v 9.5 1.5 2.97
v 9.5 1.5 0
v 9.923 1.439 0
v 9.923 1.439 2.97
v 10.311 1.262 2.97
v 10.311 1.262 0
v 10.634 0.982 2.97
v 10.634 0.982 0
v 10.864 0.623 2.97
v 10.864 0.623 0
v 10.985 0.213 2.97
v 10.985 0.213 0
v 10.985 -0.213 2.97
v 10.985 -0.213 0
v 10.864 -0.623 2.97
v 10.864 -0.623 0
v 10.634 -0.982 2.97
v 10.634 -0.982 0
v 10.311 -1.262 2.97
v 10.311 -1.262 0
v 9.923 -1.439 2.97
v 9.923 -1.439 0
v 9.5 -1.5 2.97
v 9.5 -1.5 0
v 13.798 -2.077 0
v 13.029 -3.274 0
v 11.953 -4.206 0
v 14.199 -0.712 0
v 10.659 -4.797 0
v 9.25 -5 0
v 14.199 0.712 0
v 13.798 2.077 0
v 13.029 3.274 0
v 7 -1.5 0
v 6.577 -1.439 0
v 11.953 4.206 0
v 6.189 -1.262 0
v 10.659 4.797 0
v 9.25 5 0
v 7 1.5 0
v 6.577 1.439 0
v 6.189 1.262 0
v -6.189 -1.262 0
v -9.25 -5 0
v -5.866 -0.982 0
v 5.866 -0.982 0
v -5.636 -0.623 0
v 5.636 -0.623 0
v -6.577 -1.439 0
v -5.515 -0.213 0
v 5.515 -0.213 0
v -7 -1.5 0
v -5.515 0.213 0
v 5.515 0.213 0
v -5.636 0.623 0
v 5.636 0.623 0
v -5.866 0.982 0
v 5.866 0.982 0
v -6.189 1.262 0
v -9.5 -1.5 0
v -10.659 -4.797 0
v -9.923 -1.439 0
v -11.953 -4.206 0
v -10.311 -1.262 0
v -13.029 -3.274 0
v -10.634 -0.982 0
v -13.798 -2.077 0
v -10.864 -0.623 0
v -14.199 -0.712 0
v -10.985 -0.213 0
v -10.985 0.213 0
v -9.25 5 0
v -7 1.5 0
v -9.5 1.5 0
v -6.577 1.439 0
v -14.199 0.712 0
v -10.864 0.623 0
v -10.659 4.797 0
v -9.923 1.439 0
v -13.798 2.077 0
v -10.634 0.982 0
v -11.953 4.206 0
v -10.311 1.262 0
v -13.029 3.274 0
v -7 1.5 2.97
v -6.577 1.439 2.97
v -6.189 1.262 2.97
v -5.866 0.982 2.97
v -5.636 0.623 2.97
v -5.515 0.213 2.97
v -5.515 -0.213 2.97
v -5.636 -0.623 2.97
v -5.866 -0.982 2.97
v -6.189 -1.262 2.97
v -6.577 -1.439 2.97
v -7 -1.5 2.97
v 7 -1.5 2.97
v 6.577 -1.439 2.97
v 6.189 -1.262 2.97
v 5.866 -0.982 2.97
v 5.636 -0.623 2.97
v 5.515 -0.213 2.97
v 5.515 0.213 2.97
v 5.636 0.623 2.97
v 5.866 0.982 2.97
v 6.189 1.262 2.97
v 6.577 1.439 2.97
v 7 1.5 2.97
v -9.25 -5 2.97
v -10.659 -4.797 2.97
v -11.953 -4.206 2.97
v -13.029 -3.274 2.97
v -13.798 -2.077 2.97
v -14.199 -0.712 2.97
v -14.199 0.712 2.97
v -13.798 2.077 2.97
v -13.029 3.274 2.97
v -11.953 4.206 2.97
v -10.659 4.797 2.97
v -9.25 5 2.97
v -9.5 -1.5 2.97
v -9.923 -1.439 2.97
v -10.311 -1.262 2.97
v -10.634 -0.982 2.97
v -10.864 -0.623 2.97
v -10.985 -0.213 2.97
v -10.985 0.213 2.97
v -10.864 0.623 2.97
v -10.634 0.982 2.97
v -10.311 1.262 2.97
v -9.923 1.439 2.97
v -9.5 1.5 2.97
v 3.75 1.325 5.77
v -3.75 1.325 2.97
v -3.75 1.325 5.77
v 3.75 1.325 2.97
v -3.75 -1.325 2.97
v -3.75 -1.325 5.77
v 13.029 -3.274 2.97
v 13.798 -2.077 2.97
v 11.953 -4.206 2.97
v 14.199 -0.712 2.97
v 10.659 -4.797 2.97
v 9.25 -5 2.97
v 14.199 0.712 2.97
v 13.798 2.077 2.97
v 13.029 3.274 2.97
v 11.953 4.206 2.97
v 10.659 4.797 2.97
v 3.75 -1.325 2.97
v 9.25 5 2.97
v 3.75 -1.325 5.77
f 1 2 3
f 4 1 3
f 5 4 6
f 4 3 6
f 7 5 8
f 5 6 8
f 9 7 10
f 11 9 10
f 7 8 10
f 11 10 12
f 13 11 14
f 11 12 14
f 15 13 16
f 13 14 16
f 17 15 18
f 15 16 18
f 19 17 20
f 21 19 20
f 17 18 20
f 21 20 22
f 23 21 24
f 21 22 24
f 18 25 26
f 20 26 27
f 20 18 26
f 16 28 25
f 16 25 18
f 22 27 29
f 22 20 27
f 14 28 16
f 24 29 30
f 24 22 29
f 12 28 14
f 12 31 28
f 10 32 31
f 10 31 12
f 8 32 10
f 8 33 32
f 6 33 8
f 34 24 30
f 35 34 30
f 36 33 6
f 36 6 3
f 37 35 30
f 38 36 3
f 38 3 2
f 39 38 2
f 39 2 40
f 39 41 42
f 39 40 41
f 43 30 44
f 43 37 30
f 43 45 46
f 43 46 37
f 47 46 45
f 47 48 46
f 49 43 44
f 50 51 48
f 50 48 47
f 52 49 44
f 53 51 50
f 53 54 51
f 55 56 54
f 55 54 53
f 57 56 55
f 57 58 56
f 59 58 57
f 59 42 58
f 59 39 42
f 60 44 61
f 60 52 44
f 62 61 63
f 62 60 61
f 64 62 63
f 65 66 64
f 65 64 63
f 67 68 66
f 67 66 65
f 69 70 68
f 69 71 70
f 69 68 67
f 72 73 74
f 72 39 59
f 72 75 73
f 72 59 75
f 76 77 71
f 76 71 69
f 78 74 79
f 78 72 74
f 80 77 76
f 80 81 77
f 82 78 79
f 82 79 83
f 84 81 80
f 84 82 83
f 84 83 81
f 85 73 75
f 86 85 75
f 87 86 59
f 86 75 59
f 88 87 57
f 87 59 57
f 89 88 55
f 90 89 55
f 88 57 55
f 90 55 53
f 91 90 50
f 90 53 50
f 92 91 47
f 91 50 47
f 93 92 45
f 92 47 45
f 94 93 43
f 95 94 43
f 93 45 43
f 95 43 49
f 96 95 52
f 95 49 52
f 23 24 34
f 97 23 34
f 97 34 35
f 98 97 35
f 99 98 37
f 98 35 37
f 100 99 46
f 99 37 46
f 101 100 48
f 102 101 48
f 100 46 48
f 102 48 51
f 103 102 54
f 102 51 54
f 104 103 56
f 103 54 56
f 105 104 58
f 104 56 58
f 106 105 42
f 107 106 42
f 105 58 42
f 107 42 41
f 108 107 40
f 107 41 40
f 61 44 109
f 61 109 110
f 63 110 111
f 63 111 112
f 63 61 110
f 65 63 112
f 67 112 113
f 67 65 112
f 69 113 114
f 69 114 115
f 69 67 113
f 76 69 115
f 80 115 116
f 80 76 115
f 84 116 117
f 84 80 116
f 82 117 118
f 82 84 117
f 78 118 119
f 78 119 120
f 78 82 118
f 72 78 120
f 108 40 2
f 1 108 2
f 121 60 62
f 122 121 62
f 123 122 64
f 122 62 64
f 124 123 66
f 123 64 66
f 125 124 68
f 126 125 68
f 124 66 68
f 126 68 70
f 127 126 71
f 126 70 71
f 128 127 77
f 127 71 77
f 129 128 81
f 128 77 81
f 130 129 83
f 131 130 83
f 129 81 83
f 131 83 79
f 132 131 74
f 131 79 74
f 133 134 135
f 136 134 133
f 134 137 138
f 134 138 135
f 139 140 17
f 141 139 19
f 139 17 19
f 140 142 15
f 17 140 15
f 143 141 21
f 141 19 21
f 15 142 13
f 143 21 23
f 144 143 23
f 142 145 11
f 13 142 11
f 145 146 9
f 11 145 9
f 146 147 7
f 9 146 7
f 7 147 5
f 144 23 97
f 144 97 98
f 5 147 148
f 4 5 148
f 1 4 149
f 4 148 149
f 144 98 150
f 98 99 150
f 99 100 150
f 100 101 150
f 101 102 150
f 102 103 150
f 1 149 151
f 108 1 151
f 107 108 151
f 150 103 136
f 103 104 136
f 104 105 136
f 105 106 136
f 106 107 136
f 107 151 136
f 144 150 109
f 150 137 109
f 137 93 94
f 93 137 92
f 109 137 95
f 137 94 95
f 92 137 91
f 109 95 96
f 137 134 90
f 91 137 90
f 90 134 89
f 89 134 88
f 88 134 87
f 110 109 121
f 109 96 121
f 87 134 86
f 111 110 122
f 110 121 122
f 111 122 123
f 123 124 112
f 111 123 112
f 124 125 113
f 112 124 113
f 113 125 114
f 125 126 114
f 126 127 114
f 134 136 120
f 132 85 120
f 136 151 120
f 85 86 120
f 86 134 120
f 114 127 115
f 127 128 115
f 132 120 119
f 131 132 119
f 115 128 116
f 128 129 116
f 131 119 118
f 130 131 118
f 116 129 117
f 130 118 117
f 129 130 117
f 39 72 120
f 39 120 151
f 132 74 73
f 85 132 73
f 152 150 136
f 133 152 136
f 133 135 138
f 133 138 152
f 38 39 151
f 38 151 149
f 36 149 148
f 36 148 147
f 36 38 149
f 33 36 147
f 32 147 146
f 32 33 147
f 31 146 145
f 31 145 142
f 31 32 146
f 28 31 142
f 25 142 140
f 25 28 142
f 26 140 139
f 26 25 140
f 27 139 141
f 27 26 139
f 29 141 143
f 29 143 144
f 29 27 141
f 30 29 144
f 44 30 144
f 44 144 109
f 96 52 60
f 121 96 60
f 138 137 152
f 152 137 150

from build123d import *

# Parameters (mm, degrees)
BOSS_EXTRUDE2_DEPTH = 2.97
SKETCH5_W           = 7.5
SKETCH5_H           = 2.65
BOSS_EXTRUDE3_DEPTH = 2.8


with BuildPart() as part:
    # Sketch3 → Boss-Extrude2 (new body)
    with BuildSketch(Plane.XY):
        with BuildLine():
            Line((-9.25, 5), (9.25, 5))
            ThreePointArc((9.25, 5), (14.25, 0), (9.25, -5))
            Line((9.25, -5), (-9.25, -5))
            ThreePointArc((-9.25, -5), (-14.25, 0), (-9.25, 5))
        make_face()
        with BuildLine():
            Line((-9.5, 1.5), (-7, 1.5))
            ThreePointArc((-7, 1.5), (-5.5, 0), (-7, -1.5))
            Line((-7, -1.5), (-9.5, -1.5))
            ThreePointArc((-9.5, -1.5), (-11, 0), (-9.5, 1.5))
        make_face(mode=Mode.SUBTRACT)
        with BuildLine():
            Line((9.5, -1.5), (7, -1.5))
            ThreePointArc((7, -1.5), (5.5, 0), (7, 1.5))
            Line((7, 1.5), (9.5, 1.5))
            ThreePointArc((9.5, 1.5), (11, 0), (9.5, -1.5))
        make_face(mode=Mode.SUBTRACT)
    extrude(amount=BOSS_EXTRUDE2_DEPTH)

    # Sketch5 → Boss-Extrude3 (add)
    with BuildSketch(Plane.XY.offset(2.97)):
        Rectangle(SKETCH5_W, SKETCH5_H)
    extrude(amount=BOSS_EXTRUDE3_DEPTH)


solid = part.part
